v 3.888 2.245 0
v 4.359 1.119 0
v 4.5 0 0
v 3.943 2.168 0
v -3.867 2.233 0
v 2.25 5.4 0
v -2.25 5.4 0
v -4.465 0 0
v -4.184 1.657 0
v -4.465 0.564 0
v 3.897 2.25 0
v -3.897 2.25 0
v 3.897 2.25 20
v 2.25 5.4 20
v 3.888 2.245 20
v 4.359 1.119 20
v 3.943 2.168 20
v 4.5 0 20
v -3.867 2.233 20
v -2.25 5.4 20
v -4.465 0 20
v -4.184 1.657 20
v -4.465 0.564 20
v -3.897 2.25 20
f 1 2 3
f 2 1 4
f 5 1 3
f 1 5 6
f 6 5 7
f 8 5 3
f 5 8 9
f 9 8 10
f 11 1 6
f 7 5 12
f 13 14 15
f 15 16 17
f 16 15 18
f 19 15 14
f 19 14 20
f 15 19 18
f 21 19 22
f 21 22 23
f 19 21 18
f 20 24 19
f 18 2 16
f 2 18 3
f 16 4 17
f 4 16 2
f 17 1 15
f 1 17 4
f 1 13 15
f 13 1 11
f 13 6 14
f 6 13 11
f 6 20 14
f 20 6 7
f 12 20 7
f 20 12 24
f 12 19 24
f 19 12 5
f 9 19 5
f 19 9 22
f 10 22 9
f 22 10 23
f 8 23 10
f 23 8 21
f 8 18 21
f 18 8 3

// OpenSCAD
teardropcentering2();

module teardrop( r = 4.5, h = 20 )
{
	rotate( [-270, 0, 90] )
	linear_extrude( height = h )
	{
		circle( r = r, $fn = 25);
		polygon( points = [[0, 0], [r * cos( 30 ), r * sin( 30 )], [0.5 * r, r],[-0.5 * r, r], [-r * cos( 30 ), r * sin( 30 ) ]], 
				paths = [[ 0, 1, 2, 3, 4]] );
	}
}

module teardropcentering( r = 4.5, h = 20 )
{
	rotate( [-270, 0, 90] )
	linear_extrude( height = h )
	{
		circle( r = r, $fn = 25 );
		polygon( points = [[0, 0], [r * cos( 30 ), r * sin( 30 )], [0.5 * r, 1.2 * r], [-0.5 * r, 1.2 * r], [-r * cos( 30 ), r * sin( 30 ) ]],
				paths = [[ 0, 1, 2, 3, 4]] );
	}
}

module teardropcentering2( r = 4.5, h = 20 )
{
	//rotate( [-270, 0, 90] )
	difference()
	{
		linear_extrude( height = h )
		{
			circle( r = r, $fn = 25 );
			polygon( points = [[0, 0], [r * cos( 30 ),r * sin( 30 )], [0.5 * r, 1.2 * r], [-0.5 * r, 1.2 * r], [-r * cos( 30 ), r * sin( 30 ) ]],
				paths = [[0, 1, 2, 3, 4]] );
		}
		translate( v = [-1.5 * r, -1.5 * r, -1] ) cube( size = [3 * r, 1.5 * r, h+2] );
	}
}
